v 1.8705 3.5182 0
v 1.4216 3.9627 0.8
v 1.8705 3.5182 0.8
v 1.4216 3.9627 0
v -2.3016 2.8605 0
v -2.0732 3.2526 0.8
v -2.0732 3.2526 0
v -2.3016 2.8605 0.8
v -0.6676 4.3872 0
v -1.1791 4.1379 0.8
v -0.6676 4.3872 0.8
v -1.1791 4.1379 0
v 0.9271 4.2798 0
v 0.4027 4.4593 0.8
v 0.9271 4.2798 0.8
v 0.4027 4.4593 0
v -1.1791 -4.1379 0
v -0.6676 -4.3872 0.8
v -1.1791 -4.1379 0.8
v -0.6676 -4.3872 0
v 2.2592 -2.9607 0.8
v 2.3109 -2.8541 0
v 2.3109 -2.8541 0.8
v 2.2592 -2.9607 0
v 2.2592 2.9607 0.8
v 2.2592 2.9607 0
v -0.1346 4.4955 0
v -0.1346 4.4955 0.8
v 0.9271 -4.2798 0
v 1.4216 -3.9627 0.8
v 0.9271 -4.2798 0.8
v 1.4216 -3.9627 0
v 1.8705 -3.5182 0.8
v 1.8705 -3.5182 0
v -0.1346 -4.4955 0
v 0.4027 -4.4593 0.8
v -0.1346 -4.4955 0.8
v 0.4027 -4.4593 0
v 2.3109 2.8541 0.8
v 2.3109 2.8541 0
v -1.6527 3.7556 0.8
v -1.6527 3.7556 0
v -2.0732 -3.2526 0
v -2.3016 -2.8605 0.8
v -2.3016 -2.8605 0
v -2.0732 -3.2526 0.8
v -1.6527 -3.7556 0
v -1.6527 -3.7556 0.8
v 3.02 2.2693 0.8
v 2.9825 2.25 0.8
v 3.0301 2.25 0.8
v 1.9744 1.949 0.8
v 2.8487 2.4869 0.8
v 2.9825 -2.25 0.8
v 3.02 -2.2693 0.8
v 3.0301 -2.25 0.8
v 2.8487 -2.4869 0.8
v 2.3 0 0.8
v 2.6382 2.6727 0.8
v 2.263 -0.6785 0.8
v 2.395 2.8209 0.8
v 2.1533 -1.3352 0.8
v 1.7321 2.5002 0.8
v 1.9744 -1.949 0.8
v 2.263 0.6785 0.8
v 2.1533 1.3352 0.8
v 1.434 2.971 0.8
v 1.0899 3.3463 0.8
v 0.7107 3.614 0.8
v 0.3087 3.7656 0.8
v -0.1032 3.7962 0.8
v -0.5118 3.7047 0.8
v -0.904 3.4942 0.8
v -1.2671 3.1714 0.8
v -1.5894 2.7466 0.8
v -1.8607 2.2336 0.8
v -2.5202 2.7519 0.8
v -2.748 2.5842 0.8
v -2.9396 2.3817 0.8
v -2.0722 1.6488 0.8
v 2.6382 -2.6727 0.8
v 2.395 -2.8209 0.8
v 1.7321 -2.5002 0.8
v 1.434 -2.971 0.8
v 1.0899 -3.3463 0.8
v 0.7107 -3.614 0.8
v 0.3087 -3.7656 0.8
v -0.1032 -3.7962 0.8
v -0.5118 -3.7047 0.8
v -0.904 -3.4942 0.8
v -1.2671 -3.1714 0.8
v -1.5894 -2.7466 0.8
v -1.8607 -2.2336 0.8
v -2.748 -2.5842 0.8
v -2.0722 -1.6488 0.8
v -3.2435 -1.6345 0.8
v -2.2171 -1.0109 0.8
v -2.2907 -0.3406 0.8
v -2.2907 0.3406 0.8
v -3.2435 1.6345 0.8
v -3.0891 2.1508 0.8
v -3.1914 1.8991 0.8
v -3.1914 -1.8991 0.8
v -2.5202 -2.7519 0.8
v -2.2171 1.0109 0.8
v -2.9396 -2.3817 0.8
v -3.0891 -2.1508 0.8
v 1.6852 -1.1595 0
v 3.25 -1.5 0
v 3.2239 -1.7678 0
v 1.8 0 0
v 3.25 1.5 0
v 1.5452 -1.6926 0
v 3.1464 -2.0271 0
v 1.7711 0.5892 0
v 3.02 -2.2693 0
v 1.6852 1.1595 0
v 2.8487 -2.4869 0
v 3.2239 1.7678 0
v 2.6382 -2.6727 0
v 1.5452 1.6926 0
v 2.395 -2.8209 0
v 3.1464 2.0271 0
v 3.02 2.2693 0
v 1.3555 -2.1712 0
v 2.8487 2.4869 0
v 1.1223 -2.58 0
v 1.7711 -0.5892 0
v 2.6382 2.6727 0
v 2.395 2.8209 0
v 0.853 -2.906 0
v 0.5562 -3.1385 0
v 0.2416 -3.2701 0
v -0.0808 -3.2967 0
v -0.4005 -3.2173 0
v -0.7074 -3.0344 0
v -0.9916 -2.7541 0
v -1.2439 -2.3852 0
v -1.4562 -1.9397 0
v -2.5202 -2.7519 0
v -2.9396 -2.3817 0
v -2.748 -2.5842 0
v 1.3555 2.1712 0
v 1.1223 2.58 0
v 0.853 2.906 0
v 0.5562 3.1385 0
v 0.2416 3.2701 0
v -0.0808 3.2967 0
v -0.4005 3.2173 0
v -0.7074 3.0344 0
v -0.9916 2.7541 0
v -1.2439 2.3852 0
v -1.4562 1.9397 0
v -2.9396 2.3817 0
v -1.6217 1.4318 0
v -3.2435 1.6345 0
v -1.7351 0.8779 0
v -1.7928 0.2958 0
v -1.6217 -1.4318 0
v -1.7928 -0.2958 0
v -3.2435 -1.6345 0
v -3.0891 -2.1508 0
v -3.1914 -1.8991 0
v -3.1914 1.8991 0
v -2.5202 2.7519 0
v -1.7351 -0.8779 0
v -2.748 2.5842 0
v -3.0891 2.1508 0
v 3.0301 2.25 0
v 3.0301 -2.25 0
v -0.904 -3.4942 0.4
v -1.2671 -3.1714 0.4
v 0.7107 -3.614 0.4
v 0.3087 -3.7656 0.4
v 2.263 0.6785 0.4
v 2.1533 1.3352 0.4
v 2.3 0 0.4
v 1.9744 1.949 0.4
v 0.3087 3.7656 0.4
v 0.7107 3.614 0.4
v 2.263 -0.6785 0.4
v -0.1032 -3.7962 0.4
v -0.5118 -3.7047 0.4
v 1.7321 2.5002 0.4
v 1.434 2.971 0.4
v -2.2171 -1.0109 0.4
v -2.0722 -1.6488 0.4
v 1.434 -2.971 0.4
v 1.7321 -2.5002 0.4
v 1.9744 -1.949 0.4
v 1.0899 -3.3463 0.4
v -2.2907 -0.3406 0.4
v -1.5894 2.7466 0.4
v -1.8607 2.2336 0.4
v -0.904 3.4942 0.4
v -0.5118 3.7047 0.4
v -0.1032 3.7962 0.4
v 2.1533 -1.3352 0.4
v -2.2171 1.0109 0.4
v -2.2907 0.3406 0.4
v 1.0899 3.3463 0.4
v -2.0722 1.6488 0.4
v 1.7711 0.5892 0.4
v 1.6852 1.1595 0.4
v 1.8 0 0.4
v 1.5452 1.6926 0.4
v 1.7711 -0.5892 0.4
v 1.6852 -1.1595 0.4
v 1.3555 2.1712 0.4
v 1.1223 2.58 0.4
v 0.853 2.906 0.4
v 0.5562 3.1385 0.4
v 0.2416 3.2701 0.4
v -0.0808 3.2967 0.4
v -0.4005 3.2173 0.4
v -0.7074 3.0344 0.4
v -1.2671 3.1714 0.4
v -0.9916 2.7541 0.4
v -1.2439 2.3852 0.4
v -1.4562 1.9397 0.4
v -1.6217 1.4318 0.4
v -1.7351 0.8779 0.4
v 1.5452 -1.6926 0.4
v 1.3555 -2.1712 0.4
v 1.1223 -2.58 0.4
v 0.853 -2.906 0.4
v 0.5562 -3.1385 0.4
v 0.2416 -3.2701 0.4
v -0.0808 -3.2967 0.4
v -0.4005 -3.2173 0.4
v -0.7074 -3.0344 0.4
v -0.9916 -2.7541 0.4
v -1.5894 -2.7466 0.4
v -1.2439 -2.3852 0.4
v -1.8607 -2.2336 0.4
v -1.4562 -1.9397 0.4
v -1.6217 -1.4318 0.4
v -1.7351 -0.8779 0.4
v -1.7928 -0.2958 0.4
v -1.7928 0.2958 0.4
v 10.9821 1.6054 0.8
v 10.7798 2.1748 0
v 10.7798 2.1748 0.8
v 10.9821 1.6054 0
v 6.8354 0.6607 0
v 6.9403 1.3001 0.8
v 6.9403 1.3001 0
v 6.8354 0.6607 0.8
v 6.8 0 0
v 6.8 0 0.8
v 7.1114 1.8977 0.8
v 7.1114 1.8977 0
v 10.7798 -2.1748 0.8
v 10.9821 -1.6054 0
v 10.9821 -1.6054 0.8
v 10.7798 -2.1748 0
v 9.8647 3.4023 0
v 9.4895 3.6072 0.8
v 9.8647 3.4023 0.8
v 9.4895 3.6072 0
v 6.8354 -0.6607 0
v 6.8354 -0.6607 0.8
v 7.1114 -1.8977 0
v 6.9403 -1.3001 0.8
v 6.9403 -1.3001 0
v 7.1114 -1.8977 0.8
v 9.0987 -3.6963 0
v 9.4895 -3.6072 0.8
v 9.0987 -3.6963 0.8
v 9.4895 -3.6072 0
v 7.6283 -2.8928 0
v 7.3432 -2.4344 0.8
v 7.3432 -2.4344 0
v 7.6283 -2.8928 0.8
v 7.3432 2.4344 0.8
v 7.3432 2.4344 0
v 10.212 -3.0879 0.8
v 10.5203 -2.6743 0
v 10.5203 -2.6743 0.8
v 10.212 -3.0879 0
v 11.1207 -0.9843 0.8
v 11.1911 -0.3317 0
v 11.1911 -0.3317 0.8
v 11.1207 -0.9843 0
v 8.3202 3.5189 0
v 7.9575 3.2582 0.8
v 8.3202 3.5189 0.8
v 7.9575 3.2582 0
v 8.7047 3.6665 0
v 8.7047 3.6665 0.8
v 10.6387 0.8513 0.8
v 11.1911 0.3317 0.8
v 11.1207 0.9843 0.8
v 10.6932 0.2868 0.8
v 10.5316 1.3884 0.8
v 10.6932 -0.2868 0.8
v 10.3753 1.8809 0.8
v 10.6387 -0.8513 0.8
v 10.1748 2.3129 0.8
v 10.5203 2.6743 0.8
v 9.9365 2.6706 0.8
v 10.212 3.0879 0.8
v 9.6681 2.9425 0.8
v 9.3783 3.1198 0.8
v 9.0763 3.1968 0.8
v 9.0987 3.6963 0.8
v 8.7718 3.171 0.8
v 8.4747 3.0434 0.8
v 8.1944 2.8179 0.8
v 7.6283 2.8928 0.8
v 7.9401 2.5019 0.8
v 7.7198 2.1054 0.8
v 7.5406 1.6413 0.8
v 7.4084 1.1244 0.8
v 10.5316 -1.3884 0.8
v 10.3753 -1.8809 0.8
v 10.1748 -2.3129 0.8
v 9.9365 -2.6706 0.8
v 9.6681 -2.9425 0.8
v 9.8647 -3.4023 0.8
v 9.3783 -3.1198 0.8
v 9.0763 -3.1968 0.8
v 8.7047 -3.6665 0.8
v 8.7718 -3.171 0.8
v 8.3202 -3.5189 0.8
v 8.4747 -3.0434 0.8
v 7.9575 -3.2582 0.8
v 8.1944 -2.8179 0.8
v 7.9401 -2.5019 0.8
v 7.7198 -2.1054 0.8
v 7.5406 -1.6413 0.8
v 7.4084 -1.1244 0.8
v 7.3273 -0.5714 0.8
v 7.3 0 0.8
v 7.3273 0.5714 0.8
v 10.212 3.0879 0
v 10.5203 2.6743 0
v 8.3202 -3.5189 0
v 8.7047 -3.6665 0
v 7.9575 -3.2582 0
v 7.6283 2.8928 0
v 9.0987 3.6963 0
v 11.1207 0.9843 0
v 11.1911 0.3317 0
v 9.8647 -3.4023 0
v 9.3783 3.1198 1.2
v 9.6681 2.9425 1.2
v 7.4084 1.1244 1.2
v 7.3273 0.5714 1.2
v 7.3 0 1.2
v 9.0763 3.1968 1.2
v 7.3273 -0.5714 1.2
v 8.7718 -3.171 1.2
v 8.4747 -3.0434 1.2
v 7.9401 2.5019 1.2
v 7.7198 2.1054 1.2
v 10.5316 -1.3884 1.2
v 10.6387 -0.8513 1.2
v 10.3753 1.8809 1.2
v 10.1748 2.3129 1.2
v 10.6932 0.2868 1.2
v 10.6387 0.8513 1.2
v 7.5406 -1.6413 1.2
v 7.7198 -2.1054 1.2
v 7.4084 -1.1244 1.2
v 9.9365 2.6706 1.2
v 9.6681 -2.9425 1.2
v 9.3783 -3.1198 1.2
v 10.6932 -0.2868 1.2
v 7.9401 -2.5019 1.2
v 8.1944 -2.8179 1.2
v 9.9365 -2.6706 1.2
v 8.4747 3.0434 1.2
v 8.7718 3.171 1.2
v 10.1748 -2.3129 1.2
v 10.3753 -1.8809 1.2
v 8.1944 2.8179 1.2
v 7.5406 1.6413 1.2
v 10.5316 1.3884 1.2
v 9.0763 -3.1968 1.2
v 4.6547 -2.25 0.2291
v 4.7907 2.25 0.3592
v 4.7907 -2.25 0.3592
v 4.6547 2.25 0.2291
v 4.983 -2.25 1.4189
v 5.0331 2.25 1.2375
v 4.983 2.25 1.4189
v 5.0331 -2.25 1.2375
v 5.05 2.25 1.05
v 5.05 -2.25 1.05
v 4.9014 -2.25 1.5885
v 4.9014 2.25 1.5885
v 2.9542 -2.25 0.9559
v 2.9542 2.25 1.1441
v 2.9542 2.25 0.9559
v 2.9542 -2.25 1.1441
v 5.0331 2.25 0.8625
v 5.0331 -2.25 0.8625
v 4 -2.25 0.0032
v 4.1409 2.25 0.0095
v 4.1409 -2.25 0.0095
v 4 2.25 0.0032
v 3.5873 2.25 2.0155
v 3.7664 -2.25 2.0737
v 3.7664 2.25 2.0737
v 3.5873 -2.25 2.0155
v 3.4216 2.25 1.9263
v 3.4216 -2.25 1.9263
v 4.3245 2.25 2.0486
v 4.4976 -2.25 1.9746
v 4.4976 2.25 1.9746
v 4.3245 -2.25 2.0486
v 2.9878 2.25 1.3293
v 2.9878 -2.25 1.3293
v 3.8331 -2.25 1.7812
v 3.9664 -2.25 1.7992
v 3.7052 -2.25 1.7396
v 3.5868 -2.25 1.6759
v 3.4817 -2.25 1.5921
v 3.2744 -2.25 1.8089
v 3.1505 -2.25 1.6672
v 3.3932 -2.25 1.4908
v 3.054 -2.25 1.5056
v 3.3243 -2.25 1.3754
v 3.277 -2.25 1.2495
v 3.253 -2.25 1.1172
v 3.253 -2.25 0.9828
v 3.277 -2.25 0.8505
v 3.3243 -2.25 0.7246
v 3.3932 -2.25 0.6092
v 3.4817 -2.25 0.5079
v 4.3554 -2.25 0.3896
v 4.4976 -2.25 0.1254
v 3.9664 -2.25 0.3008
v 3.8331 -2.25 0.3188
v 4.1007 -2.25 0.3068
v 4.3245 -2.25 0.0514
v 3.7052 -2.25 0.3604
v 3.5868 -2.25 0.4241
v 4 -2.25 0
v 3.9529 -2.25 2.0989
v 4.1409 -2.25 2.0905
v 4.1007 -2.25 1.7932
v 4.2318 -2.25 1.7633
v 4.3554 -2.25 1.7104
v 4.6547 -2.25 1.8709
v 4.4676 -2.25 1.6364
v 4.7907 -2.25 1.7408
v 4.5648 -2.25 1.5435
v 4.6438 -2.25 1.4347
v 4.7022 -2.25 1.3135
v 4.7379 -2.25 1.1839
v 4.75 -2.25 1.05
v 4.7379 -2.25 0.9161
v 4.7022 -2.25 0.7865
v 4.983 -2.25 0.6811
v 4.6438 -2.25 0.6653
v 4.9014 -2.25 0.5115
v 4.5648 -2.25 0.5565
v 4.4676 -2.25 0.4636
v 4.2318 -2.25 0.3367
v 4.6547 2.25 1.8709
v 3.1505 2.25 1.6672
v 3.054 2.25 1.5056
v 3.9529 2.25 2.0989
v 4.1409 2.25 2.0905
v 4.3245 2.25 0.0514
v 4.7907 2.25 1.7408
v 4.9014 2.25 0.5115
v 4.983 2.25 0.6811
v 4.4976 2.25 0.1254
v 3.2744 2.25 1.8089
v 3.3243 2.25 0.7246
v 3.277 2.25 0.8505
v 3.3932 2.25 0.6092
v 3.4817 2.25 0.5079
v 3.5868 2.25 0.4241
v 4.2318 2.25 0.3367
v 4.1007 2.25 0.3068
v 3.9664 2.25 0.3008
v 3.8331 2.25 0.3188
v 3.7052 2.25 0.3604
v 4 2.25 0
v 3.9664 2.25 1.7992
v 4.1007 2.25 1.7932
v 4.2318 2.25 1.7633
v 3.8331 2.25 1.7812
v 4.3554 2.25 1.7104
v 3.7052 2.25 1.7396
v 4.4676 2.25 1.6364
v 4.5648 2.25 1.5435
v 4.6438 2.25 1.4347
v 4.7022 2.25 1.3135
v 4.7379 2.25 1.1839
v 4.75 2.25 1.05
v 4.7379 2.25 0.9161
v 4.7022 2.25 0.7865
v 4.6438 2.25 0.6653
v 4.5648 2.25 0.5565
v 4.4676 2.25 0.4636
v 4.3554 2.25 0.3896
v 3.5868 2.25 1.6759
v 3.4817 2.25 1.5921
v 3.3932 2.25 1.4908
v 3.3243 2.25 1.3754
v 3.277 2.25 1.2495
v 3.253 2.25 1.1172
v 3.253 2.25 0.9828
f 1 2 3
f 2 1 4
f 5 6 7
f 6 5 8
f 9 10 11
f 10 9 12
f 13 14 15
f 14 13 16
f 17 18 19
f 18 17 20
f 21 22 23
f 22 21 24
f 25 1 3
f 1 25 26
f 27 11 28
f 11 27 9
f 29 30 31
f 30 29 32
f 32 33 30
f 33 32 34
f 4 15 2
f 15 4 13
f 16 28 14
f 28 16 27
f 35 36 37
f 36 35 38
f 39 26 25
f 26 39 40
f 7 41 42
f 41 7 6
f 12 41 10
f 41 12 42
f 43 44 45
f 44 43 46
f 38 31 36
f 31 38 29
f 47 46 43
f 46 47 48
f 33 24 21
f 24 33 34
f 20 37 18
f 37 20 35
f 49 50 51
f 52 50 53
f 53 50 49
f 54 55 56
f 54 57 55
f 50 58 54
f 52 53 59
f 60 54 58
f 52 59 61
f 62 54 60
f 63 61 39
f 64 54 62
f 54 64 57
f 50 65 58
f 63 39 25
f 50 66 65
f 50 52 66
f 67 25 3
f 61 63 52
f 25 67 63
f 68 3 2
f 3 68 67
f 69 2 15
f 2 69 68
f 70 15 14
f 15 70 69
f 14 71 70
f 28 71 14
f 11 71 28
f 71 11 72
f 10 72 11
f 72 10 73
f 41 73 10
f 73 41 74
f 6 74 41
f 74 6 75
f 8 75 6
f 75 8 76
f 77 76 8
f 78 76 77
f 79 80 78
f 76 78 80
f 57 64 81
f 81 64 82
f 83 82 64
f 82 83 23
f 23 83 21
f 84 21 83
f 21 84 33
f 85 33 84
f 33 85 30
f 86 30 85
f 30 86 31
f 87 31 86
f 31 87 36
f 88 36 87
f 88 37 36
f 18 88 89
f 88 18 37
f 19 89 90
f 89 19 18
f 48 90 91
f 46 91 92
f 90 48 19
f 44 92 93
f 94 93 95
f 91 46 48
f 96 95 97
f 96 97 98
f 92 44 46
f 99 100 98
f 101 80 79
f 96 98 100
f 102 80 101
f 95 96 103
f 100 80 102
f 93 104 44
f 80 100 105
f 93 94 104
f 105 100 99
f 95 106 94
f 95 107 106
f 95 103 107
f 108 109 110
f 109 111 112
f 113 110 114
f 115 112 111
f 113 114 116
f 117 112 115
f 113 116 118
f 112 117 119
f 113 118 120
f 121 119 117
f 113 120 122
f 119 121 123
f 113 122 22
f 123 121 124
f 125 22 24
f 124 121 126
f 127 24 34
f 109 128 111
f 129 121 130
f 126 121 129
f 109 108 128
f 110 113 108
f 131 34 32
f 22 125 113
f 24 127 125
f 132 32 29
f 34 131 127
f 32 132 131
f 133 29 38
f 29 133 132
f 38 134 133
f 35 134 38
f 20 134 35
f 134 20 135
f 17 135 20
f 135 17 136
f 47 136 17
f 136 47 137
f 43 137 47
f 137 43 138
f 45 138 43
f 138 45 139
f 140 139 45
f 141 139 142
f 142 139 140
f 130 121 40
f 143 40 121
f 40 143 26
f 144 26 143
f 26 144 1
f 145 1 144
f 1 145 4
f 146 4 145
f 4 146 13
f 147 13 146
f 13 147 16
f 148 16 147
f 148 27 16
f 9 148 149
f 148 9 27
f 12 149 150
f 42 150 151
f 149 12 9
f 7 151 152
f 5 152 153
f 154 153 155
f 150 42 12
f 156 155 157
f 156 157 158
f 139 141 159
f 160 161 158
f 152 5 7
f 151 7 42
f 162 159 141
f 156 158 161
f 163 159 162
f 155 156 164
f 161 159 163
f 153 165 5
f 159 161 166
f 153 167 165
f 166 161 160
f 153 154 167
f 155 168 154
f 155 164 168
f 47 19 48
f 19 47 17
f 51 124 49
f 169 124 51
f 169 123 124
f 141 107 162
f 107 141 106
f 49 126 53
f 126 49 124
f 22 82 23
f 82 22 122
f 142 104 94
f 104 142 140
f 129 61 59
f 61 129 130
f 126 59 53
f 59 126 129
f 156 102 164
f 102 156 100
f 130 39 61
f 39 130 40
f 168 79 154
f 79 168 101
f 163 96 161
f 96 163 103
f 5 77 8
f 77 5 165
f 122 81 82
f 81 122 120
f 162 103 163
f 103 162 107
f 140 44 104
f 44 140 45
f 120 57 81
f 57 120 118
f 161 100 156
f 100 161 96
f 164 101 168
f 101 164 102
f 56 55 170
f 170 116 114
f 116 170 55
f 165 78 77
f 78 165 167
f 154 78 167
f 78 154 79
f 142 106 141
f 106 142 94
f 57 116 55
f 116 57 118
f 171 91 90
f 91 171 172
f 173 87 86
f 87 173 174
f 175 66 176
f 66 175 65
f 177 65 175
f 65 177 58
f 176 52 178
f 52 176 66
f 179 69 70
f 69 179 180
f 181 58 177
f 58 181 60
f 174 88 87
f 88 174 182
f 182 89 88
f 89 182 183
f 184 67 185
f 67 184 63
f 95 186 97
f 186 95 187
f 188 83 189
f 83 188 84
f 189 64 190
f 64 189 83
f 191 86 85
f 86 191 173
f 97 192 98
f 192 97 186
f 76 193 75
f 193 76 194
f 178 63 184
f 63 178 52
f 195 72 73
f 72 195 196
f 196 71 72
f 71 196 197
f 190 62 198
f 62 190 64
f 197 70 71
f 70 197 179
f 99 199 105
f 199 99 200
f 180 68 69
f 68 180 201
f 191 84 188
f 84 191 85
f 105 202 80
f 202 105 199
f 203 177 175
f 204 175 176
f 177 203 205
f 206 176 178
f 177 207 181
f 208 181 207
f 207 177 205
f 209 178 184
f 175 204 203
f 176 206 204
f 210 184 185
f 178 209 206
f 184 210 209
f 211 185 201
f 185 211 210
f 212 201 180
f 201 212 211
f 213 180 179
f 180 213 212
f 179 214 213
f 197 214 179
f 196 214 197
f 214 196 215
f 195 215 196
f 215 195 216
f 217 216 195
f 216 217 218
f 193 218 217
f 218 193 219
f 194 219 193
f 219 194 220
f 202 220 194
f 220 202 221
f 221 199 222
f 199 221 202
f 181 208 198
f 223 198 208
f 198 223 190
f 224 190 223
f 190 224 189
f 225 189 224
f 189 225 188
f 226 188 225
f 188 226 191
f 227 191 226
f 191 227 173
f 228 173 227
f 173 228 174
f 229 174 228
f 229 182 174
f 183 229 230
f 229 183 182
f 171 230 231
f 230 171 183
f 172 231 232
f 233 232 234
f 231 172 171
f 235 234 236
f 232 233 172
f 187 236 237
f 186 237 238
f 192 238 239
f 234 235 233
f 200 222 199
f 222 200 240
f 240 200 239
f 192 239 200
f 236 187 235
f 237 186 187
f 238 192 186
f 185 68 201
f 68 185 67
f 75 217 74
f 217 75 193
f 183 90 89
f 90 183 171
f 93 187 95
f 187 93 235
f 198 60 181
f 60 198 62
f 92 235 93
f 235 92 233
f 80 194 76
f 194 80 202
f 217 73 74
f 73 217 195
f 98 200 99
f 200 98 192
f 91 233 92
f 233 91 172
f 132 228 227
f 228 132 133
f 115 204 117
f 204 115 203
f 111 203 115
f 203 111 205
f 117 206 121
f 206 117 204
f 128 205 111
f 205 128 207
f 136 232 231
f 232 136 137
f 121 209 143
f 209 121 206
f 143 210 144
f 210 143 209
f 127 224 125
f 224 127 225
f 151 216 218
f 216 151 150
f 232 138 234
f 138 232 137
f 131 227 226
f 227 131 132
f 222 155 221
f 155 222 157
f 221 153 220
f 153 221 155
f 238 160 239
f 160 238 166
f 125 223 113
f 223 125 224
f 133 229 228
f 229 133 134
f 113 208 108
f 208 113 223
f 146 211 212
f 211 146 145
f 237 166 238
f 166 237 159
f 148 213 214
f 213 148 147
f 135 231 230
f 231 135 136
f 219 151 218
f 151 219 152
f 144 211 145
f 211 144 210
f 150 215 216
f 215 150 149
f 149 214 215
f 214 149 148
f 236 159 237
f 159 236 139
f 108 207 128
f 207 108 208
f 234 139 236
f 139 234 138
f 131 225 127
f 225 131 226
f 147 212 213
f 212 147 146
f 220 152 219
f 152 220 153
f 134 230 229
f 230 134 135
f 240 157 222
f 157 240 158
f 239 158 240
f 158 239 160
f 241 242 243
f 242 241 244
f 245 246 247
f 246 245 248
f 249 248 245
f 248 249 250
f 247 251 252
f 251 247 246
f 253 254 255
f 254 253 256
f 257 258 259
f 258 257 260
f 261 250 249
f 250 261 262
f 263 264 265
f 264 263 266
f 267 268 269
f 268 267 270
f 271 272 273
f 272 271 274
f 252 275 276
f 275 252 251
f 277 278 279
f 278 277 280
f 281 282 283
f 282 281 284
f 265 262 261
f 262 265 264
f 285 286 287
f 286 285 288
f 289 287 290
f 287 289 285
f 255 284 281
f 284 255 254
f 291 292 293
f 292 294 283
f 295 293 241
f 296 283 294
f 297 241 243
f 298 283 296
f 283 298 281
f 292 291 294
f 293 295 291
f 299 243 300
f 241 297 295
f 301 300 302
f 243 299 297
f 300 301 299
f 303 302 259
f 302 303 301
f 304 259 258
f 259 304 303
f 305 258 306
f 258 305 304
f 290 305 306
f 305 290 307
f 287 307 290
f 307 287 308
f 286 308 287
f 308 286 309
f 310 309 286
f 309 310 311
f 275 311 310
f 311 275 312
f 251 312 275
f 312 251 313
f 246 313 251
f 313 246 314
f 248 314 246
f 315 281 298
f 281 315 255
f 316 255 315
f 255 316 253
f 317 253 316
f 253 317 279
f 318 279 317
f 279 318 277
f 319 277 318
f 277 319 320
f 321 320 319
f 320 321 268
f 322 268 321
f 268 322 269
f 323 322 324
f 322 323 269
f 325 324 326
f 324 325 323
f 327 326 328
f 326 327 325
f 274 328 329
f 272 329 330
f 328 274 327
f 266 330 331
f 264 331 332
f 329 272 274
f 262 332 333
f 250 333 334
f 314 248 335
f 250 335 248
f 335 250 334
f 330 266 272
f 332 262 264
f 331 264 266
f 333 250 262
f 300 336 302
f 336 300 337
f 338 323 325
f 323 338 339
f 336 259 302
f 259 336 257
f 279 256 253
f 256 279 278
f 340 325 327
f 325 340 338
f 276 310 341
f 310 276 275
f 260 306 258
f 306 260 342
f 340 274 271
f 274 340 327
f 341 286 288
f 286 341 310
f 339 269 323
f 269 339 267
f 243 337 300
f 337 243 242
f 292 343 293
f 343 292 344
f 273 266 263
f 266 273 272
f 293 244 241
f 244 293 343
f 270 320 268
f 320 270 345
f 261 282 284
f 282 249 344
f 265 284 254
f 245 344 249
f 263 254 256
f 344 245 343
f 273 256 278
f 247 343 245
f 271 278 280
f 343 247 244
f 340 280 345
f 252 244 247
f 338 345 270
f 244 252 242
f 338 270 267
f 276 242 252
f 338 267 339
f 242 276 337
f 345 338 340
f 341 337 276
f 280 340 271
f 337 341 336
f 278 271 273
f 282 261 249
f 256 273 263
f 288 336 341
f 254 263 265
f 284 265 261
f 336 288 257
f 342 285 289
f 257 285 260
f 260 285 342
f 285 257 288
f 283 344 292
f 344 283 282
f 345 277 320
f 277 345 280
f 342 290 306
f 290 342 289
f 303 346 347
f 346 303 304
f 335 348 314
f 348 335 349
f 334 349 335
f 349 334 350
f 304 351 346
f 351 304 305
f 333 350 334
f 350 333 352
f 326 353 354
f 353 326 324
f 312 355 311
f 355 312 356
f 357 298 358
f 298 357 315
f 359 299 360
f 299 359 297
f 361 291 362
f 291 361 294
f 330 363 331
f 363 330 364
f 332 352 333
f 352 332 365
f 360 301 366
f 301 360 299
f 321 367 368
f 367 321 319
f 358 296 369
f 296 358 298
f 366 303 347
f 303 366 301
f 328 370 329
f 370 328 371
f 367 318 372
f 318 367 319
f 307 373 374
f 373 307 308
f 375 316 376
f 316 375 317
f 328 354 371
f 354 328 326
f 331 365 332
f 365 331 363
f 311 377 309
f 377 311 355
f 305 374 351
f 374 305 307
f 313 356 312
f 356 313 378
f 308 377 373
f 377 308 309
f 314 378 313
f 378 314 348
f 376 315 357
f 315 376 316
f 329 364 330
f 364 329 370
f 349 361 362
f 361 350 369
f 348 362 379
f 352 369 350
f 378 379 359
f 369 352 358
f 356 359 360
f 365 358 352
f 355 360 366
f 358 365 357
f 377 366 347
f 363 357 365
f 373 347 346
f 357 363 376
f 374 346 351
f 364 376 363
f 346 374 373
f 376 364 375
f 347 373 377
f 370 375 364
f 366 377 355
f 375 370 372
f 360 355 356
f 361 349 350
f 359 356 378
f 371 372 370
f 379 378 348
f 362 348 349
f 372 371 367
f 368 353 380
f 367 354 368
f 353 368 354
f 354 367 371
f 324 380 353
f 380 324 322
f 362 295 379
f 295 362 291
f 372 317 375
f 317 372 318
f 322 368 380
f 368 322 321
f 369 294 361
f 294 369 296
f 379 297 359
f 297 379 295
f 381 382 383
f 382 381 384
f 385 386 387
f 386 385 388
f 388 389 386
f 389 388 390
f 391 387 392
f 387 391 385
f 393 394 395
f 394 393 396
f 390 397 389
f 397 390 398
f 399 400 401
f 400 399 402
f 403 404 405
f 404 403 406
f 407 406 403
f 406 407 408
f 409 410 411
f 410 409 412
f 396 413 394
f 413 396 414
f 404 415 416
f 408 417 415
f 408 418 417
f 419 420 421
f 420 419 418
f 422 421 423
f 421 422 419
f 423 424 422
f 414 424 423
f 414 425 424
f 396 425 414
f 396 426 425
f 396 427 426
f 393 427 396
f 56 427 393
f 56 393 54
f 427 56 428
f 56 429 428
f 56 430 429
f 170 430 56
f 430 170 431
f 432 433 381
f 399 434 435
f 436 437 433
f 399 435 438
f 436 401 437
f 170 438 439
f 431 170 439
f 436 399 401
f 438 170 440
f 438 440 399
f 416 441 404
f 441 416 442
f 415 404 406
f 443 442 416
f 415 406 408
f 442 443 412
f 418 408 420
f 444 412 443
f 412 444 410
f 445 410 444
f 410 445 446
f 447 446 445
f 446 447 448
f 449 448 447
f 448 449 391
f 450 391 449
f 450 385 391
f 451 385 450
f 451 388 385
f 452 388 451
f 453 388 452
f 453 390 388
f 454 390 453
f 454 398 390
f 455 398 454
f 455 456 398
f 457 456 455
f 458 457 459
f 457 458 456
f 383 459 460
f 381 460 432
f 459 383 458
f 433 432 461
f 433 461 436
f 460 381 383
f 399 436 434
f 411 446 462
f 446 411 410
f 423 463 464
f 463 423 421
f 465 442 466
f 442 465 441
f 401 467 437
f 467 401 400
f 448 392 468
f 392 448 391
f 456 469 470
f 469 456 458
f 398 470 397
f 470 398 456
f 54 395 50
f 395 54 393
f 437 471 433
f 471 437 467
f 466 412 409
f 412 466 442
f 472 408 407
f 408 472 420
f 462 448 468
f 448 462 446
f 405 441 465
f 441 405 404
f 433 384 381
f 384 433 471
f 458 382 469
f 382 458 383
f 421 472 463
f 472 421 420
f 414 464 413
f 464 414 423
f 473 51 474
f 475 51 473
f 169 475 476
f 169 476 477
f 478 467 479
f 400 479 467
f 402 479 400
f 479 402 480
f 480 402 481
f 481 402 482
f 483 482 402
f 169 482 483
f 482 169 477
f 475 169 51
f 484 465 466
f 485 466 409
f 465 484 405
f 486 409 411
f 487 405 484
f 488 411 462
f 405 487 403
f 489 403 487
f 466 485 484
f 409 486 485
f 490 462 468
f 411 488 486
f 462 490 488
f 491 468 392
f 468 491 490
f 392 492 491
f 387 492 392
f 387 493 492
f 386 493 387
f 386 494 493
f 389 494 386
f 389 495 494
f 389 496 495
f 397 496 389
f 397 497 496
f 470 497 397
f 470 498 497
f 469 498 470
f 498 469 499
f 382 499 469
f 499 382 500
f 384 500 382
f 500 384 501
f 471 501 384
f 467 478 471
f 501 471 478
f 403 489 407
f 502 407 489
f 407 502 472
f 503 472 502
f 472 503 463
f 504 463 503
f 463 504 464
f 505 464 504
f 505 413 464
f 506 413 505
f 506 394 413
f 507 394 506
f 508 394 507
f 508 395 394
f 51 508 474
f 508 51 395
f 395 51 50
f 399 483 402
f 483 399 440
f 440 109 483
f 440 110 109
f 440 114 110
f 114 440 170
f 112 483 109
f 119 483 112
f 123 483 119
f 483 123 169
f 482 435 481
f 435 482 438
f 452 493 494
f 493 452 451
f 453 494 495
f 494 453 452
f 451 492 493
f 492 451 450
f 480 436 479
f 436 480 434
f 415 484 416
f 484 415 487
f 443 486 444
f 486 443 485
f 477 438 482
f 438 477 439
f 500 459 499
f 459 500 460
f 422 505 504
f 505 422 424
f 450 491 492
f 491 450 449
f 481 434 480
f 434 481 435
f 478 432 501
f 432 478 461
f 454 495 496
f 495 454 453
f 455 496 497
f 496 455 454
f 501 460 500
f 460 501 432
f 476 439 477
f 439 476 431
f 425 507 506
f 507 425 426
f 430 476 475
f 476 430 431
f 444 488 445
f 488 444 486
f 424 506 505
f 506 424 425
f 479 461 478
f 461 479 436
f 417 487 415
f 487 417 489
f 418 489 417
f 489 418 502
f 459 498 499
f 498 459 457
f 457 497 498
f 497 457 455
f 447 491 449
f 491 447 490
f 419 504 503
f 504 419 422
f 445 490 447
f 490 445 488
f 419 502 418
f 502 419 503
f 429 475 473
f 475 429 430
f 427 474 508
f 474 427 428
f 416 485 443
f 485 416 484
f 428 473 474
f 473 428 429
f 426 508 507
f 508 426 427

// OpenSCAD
gripThickness=0.8;
gripWidth=6;
gripDepth=9;

// how much smaller is the insert than the tab itself (deducted from both sides)
tabInsertOffset = 0.5; 
// how much smaller is the tab than the gripper?
tabOffset = 0.8;
// how much additional tolerance should we deduct from the insert to make the tab fit properly?
tabFitTolerance = 0.1;

tabThickness=gripThickness;
tabWidth=gripWidth-tabOffset*2;
tabDepth=gripDepth-tabOffset*2;

tabInsertWidth=tabWidth-tabInsertOffset*2;
tabInsertDepth=tabDepth-tabInsertOffset*2;
tabInsertThickness=tabThickness*0.5;

ropeMount=false;
ropeDiameter=1.5;
ropeTubeThickness=0.3;
ropeSupportThickness=0.5;

gripHandleWidth=0.5;

module createTab(offset=0) {
	translate([0,0,tabInsertThickness]) {
		union() {
			scale([tabWidth+offset*2,tabDepth+offset*2,1]) {
				cylinder(h=tabThickness+offset*2,r=0.5,center=false,$fn=35);
			}
			translate([0,0,-tabInsertThickness-offset])
				scale([tabInsertWidth+offset*2,tabInsertDepth+offset*2,1]) {
					cylinder(h=tabInsertThickness+offset*2,r=0.5,center=false,$fn=35);
				}
		}
	}
};

module createGrip() {
	difference() {
		union() {
			scale([gripWidth,gripDepth,1]) {
				cylinder(h=gripThickness,r=0.5,center=false,$fn=35);
			}
			rotate(0,[0,0,1]) {
				scale([gripWidth+gripHandleWidth,gripWidth,gripThickness]) {
					translate([0,0,0.5]) {
						scale([0.5,0.5,0.5]) {
							minkowski() {
								cube([1,1,1],center=true);
								cylinder(r=0.5,h=1,center=true,$fn=35);
							}
						}
					}
				}
			}
		}
		createTab(tabFitTolerance);
	}
};

module createRopeTube() {
	translate([ropeSupportThickness*2,0,ropeDiameter/2+ropeTubeThickness])
	rotate(90,[1,0,0]) {
		difference() {
			union() {
				cylinder(h=gripDepth/2,r=ropeDiameter/2+ropeTubeThickness,center=true,$fn=35);
				translate([-ropeSupportThickness,-ropeDiameter/2-ropeTubeThickness+gripThickness/2,0])
					cube([ropeSupportThickness*2,gripThickness,gripDepth/2],center=true);
			}
			cylinder(h=gripDepth/2+1,r=ropeDiameter/2,center=true,$fn=35);
		}
	}

};

createGrip();
rotate(180,[0,1,0])
	translate([-gripWidth-3,0,-tabThickness-tabInsertThickness])
		createTab();
translate([gripWidth/2,0,0])
	createRopeTube();
